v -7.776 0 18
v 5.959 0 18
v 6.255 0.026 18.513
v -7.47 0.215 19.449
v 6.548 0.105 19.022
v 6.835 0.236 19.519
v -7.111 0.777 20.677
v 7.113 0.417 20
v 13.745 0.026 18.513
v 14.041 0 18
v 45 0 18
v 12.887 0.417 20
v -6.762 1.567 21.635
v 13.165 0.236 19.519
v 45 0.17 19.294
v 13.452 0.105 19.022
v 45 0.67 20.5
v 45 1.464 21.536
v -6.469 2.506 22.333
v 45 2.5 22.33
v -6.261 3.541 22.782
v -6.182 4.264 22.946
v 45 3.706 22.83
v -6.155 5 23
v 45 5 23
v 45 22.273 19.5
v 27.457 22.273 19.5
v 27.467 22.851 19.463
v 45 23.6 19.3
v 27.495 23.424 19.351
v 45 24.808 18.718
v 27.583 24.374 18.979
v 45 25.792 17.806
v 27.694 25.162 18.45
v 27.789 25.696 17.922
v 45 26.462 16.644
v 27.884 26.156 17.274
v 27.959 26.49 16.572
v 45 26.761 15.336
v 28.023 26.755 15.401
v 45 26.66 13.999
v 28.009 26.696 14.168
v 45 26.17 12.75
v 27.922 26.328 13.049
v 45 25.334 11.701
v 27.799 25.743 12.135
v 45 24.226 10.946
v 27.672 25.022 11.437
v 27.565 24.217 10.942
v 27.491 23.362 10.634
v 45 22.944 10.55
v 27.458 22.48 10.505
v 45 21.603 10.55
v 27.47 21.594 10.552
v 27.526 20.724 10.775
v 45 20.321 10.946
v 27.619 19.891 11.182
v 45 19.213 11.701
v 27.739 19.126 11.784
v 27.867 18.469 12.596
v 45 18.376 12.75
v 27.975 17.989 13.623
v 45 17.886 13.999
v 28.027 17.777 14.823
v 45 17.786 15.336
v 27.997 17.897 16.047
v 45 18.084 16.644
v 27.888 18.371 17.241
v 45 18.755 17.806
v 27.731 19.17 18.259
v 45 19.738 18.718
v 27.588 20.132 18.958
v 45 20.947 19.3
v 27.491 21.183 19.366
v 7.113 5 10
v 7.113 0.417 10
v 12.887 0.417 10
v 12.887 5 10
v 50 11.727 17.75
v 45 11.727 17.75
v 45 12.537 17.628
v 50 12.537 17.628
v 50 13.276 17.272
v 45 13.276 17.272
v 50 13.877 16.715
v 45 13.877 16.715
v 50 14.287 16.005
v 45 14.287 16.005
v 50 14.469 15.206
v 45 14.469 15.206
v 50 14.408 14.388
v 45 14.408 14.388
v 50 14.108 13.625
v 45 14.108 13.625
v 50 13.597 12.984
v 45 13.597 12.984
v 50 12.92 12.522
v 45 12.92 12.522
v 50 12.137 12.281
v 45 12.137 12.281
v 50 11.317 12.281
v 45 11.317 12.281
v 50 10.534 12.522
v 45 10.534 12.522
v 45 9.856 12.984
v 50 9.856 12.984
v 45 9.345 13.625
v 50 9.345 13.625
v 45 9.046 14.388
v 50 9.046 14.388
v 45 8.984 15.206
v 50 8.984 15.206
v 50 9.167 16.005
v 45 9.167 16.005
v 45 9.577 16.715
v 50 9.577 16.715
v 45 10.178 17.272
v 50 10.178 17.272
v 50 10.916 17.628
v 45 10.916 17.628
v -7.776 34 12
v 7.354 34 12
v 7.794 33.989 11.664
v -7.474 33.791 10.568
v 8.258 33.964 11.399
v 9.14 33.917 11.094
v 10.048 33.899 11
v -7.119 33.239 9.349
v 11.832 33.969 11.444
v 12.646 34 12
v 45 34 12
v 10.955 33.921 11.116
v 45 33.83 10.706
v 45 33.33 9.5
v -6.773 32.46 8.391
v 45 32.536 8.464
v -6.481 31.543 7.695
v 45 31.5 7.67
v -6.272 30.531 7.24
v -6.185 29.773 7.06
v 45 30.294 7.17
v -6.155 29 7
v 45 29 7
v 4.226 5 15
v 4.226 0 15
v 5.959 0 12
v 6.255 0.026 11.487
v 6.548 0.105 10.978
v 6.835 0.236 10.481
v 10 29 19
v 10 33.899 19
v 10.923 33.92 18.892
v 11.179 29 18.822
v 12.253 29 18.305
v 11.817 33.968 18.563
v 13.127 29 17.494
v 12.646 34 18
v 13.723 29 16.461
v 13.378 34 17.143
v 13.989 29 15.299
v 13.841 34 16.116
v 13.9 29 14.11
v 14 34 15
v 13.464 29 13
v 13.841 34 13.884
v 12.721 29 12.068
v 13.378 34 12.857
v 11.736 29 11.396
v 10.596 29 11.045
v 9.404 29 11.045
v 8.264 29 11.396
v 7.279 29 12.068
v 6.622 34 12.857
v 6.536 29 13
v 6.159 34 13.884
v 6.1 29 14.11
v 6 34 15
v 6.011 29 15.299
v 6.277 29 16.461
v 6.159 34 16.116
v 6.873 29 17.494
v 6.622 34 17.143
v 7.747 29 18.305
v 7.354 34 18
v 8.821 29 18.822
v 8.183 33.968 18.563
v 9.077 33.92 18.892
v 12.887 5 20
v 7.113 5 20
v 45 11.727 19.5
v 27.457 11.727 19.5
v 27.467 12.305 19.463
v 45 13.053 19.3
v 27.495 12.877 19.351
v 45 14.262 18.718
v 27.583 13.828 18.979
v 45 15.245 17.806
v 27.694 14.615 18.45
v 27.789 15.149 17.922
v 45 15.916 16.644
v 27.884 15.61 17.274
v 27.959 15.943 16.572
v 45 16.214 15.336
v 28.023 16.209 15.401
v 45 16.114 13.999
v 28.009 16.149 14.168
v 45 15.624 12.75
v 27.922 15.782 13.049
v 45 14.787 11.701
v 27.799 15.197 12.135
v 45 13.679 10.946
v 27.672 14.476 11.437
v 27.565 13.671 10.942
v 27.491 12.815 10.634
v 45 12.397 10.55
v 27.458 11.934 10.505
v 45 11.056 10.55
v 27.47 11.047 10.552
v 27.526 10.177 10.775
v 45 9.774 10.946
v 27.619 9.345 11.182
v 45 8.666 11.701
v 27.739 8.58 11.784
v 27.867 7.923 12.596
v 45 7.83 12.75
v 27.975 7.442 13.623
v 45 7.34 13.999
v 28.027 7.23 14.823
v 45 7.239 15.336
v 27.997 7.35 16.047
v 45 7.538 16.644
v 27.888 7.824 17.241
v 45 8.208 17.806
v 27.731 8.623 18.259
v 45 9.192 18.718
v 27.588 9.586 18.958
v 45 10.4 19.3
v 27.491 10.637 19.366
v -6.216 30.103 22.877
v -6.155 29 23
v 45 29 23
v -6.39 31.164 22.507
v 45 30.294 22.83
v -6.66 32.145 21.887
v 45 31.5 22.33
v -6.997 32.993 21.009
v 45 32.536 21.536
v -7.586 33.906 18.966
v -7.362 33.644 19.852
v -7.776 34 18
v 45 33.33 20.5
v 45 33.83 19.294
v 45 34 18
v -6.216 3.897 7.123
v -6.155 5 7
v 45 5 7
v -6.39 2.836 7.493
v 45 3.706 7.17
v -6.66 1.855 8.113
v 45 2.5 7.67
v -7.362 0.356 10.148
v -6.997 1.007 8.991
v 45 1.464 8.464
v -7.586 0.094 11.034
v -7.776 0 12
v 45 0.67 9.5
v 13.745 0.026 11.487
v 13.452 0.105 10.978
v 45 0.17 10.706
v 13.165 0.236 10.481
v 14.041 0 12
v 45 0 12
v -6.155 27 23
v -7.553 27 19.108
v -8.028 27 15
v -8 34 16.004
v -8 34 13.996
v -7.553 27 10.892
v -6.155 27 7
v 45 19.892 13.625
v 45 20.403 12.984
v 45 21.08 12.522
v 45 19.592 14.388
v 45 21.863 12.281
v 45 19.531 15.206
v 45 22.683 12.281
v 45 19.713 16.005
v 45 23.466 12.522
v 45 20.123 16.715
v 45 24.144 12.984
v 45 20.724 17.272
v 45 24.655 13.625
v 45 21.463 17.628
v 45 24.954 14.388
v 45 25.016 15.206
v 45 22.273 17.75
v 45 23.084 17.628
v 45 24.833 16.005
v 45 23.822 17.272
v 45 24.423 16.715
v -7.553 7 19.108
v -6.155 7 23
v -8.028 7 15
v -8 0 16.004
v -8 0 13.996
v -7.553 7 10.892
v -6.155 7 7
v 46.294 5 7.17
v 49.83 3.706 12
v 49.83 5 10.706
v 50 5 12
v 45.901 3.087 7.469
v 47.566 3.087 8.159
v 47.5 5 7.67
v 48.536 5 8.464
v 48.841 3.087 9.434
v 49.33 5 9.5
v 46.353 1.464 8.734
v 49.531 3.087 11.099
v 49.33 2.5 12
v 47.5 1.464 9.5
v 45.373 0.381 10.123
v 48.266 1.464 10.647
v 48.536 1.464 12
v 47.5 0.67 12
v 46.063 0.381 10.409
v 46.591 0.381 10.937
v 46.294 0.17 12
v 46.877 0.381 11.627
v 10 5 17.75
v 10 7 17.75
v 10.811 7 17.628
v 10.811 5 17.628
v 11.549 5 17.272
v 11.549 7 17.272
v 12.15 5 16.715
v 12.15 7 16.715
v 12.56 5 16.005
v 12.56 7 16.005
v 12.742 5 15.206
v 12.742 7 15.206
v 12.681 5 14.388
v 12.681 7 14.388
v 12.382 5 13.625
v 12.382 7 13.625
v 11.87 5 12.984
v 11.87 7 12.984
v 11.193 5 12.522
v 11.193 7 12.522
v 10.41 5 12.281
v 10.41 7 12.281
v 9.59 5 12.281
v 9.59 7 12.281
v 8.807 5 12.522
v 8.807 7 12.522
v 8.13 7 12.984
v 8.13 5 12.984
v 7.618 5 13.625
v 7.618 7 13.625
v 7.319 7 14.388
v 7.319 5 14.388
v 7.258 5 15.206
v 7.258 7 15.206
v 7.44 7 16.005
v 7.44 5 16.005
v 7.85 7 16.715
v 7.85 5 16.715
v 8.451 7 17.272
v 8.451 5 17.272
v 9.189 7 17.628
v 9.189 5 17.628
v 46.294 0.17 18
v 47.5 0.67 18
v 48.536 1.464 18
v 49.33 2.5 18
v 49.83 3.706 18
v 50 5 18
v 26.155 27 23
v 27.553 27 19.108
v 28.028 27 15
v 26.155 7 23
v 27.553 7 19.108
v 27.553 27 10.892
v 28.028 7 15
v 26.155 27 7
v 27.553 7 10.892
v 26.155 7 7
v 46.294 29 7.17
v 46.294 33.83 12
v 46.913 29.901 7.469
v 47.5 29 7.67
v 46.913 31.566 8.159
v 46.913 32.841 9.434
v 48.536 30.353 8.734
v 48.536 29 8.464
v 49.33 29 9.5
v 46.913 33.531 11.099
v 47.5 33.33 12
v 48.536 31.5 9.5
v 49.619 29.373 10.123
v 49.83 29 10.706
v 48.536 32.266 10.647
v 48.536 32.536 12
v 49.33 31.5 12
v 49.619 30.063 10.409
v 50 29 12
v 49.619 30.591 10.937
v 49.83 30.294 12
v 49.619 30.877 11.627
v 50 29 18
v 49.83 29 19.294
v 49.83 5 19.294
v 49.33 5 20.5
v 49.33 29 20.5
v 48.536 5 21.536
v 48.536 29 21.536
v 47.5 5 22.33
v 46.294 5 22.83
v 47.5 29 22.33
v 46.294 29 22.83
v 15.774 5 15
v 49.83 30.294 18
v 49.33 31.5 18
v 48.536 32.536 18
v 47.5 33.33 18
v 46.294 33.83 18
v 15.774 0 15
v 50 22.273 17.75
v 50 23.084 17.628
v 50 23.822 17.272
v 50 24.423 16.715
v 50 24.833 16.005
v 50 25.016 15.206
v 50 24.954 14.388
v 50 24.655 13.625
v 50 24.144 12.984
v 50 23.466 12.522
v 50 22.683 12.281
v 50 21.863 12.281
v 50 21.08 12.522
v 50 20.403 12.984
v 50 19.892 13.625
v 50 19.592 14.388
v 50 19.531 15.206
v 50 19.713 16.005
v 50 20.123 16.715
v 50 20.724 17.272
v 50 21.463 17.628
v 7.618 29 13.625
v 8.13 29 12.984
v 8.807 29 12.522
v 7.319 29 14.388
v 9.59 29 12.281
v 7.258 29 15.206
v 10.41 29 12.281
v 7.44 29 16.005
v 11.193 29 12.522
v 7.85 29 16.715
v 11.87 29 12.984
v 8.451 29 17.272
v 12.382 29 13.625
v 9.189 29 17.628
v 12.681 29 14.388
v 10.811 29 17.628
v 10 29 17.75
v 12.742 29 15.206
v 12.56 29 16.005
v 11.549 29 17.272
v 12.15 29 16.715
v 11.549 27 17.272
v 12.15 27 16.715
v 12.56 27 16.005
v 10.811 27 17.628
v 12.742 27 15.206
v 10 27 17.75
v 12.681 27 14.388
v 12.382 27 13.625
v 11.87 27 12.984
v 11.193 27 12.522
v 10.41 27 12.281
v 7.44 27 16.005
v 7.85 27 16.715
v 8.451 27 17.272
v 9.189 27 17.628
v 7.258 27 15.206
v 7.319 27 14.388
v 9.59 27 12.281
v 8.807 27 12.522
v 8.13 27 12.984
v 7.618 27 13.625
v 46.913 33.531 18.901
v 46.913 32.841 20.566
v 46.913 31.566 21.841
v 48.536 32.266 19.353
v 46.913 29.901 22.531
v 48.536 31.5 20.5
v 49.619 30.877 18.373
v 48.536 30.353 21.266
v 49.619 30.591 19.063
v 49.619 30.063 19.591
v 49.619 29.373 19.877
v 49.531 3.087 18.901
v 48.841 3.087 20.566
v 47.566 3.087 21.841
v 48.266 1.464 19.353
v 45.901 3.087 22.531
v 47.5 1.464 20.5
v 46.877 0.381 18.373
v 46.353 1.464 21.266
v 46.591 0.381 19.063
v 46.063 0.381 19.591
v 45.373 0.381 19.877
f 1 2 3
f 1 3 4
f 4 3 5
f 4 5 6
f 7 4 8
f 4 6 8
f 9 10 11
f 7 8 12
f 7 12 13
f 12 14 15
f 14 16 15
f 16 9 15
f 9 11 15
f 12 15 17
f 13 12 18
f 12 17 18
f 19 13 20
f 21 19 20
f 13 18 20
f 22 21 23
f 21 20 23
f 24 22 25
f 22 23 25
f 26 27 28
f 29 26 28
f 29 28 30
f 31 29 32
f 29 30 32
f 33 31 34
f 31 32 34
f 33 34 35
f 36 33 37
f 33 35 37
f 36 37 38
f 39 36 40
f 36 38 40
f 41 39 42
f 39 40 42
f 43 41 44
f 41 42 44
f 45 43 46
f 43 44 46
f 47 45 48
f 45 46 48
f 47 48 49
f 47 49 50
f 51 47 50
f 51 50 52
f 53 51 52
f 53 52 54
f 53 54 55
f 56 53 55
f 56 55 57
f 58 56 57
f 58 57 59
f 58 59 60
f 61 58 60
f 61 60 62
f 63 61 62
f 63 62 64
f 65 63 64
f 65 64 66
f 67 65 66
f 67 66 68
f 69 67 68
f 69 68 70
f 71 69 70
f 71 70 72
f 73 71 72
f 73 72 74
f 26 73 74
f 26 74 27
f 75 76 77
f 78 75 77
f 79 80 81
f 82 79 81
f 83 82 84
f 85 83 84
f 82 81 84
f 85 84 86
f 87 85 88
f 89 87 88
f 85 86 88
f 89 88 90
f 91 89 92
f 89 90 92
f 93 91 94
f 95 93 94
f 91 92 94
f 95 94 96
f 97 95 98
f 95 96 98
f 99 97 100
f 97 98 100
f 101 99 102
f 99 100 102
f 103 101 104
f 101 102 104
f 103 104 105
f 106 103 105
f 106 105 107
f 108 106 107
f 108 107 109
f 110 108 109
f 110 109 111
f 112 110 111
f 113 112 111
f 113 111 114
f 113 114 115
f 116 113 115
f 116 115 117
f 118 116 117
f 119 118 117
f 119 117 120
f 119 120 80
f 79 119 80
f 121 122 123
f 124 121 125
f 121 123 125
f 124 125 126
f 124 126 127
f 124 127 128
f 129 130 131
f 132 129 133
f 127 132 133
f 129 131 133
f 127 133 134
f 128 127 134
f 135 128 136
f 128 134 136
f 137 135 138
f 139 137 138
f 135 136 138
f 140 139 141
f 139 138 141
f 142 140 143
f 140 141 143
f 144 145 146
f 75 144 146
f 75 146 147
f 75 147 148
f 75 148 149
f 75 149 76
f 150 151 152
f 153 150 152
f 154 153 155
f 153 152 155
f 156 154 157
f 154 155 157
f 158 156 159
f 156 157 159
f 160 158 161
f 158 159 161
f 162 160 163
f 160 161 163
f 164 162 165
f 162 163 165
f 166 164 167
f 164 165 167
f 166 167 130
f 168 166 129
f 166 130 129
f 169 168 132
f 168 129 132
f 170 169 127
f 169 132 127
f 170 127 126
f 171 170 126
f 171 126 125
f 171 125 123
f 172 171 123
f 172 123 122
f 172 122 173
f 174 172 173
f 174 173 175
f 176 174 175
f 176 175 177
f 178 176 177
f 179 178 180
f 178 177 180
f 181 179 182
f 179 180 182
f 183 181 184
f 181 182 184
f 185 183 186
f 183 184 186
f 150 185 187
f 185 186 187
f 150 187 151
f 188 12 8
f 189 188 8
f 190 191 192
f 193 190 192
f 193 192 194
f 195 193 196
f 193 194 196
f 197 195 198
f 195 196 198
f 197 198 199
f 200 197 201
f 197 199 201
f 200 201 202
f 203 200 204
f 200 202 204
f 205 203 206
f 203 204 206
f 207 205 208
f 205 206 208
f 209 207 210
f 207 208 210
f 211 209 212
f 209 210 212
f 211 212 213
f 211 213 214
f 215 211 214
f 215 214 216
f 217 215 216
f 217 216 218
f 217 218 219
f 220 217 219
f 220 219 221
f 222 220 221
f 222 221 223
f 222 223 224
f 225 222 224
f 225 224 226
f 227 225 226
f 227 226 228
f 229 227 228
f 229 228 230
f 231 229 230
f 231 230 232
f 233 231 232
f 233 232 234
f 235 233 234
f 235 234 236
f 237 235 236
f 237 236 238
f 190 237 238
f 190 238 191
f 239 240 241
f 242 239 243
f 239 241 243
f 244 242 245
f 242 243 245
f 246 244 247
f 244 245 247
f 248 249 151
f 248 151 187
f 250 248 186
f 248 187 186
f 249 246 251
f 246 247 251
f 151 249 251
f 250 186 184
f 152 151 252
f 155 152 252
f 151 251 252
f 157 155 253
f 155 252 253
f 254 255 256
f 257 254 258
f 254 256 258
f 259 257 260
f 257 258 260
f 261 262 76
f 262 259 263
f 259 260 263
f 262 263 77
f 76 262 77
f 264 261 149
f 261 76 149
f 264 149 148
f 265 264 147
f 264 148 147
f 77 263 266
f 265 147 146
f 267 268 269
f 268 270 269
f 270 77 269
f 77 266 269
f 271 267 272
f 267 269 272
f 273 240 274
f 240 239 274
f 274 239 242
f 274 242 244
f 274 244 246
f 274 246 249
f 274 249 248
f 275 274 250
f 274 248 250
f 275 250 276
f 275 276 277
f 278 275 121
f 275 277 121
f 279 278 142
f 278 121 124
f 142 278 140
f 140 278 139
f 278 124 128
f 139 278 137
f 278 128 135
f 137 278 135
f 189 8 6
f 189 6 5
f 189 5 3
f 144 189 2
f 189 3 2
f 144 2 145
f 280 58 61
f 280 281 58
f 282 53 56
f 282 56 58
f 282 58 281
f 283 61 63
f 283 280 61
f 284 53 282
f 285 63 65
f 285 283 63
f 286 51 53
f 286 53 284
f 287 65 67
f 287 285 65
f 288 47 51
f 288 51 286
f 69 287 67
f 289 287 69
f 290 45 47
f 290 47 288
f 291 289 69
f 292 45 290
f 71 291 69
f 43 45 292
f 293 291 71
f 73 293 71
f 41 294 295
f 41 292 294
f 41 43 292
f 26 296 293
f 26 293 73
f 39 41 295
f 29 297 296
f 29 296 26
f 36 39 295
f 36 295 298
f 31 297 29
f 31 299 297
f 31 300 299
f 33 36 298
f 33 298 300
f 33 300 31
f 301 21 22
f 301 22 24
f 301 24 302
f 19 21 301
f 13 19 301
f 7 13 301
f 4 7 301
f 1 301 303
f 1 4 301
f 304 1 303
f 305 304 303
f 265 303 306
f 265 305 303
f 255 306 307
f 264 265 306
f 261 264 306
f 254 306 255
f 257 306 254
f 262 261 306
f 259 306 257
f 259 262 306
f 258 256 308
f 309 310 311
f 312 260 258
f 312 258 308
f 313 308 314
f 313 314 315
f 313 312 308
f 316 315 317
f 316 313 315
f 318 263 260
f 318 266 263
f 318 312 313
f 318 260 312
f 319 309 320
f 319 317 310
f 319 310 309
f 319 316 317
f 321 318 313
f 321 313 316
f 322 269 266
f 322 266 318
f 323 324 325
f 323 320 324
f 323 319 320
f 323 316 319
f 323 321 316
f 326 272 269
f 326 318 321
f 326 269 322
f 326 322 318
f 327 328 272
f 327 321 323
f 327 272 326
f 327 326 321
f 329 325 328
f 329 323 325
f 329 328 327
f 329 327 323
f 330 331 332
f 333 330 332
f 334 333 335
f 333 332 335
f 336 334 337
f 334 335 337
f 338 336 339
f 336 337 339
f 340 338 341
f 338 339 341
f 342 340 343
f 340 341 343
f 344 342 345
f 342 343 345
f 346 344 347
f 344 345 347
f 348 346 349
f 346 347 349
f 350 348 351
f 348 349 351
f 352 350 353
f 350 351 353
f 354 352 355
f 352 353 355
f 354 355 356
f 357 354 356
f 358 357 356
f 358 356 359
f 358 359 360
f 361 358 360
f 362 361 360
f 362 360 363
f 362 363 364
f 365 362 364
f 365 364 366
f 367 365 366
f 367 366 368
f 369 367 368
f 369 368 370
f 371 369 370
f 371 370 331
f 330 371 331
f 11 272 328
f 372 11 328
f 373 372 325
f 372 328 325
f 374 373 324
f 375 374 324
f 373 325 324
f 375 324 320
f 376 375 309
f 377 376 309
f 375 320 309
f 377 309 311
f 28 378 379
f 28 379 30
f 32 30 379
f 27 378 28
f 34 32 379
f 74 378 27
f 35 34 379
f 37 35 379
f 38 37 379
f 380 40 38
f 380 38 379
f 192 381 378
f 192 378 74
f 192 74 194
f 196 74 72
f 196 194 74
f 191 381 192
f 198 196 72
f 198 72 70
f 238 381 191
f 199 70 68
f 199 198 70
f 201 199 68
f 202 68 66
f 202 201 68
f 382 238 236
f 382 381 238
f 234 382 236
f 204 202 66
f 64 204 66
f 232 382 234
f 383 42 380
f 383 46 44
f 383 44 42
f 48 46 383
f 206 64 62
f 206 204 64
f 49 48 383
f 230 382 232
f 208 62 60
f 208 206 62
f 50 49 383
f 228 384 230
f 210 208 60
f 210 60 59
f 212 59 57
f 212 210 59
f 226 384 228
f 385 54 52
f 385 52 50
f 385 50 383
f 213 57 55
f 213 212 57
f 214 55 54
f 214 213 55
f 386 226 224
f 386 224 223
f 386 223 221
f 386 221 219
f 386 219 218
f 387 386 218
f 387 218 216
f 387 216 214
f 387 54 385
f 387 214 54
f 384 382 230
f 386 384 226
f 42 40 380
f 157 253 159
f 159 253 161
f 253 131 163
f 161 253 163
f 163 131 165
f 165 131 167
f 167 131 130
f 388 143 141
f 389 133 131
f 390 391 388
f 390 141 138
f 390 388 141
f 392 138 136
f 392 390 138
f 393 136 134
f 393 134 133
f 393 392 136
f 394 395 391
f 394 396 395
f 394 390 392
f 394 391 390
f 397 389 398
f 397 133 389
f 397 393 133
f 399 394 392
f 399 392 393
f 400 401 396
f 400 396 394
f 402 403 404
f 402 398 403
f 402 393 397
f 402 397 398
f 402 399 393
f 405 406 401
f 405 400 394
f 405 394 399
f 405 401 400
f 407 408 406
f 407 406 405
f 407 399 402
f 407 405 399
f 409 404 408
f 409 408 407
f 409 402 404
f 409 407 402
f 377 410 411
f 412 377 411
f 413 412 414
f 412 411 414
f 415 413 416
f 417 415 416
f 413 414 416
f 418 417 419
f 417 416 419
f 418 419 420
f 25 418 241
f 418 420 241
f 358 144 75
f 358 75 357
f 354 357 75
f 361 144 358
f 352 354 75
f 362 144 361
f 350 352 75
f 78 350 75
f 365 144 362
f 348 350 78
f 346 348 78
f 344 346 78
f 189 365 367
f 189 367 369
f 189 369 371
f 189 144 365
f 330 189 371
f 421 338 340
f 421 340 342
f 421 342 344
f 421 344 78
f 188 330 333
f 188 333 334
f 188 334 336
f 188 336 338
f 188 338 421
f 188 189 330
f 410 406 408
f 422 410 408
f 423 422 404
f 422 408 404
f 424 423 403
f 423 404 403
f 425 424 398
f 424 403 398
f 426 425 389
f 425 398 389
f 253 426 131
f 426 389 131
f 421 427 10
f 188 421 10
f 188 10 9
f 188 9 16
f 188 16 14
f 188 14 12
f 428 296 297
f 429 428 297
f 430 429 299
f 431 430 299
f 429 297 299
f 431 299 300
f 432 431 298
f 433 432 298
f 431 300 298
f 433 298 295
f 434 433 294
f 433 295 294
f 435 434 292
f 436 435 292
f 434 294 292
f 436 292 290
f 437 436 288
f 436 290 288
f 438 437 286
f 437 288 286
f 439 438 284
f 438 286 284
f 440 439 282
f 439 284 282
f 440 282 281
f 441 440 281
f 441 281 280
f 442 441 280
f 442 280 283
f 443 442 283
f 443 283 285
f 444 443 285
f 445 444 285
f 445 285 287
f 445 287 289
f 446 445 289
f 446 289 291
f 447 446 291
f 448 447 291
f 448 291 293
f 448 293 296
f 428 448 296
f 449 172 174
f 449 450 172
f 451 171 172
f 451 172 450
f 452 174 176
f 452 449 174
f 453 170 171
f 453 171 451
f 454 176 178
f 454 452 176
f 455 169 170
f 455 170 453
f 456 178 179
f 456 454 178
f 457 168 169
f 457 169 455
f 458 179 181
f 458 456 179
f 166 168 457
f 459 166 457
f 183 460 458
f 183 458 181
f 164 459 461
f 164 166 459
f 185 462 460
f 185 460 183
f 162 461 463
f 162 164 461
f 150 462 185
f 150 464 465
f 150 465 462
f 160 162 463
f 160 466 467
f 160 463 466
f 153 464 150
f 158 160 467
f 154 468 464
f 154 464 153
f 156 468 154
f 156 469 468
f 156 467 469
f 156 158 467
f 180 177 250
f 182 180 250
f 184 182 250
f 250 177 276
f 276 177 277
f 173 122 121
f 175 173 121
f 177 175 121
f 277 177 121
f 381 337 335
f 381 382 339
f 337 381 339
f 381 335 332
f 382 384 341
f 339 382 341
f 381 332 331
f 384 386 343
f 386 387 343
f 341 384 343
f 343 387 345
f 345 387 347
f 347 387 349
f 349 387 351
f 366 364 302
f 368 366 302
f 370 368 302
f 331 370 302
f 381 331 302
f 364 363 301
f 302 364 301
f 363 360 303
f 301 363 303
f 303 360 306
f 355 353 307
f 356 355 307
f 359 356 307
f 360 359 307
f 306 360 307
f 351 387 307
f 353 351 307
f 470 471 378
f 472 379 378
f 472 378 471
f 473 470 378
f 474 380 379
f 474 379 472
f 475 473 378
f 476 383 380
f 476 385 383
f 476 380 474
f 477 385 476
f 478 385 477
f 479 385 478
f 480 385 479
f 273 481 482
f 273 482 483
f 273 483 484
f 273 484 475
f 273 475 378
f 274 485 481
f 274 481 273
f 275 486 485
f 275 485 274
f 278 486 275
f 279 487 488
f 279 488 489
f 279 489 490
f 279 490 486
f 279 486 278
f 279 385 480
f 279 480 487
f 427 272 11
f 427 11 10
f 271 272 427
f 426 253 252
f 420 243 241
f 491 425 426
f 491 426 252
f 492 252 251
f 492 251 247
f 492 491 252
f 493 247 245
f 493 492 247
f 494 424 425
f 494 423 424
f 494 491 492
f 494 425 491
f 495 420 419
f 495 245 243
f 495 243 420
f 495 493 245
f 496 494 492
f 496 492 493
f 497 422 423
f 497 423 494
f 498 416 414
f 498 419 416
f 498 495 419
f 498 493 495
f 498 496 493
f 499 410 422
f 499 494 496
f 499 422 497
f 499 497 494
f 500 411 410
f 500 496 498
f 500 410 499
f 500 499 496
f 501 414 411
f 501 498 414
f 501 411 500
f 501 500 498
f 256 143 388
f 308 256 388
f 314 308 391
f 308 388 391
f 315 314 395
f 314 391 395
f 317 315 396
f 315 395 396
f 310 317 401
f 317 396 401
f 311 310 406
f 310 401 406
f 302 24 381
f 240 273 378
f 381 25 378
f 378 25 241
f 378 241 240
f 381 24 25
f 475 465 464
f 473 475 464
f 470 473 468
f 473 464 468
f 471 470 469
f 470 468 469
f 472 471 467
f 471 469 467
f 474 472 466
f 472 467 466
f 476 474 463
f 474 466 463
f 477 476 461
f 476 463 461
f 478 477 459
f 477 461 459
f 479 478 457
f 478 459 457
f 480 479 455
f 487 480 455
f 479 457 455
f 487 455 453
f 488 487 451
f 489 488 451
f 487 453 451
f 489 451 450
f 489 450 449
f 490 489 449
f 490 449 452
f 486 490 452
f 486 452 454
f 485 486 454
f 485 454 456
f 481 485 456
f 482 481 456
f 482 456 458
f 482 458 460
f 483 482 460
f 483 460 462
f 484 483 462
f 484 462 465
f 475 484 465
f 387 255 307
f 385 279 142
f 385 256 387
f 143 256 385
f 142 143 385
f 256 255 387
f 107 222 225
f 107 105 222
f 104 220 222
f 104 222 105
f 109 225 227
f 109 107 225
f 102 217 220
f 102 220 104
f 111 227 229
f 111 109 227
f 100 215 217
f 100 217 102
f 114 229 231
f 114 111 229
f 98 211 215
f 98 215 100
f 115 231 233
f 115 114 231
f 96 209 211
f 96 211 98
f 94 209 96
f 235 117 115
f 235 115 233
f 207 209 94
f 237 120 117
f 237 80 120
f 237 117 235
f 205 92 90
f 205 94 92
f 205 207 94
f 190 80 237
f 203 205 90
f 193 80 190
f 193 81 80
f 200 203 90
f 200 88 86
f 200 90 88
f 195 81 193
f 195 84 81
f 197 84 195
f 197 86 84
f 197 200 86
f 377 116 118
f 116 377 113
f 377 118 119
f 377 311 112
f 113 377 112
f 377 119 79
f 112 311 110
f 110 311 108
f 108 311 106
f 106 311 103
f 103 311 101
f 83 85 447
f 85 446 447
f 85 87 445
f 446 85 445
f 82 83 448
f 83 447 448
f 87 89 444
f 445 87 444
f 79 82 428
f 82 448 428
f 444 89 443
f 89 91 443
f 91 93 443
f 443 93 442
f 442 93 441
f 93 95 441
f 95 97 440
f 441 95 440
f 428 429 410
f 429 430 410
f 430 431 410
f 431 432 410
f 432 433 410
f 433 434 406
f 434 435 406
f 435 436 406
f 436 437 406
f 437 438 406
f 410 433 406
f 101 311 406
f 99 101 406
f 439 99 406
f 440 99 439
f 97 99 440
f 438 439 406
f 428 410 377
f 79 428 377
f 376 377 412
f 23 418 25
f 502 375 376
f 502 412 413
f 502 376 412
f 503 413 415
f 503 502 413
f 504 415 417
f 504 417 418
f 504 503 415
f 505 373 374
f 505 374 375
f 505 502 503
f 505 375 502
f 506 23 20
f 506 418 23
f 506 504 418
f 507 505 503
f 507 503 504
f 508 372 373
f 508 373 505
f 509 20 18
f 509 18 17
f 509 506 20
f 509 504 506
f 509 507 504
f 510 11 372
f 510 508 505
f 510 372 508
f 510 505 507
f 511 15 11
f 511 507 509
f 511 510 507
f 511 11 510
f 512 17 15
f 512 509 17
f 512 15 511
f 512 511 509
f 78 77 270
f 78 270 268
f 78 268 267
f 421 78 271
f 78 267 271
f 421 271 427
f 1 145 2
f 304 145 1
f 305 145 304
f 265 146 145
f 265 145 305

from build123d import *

# Parameters (mm, degrees)
ESQUISSE1_W             = 50
ESQUISSE1_H             = 34
BOSS_EXTRU_1_DEPTH      = 30
BOSS_EXTRU_2_DEPTH      = 7
ESQUISSE4_R             = 4
ENL_V_MAT_EXTRU_1_DEPTH = 5
ESQUISSE5_R             = 2.75
ENL_V_MAT_EXTRU_2_DEPTH = 66.122960621
ENL_V_MAT_EXTRU_3_DEPTH = 5
ESQUISSE7_R             = 2.75
ENL_V_MAT_EXTRU_4_DEPTH = 68.498148123
ESQUISSE8_R             = 4.5
ENL_V_MAT_EXTRU_5_DEPTH = 45
ESQUISSE9_W             = 20
ESQUISSE9_H             = 20
ENL_V_MAT_EXTRU_6_DEPTH = 68.498148123
ESQUISSE11_R            = 18.027756377
ENL_V_MAT_EXTRU_7_DEPTH = 20
ESQUISSE12_W            = 7
ESQUISSE12_H            = 34
ENL_V_MAT_EXTRU_8_DEPTH = 74.642518399
CONG_1_R                = 5


with BuildPart() as part:
    # Esquisse1 → Boss.-Extru.1 (new body)
    with BuildSketch(Plane.XY):
        with Locations((25, 17)):
            Rectangle(ESQUISSE1_W, ESQUISSE1_H)
    extrude(amount=BOSS_EXTRU_1_DEPTH)

    # Esquisse3 → Boss.-Extru.2 (add)
    with BuildSketch(Plane(origin=(0, 34, 0), x_dir=(1, 0, 0), z_dir=(0, 1, 0))):
        with BuildLine():
            Line((0, 0), (0, -30))
            ThreePointArc((0, -30), (-8.027756377, -15), (0, 0))
        make_face()
    boss_extru_2 = extrude(amount=-BOSS_EXTRU_2_DEPTH)

    # Symétrie1: Boss.-Extru.2 across plane
    add(boss_extru_2.mirror(Plane.ZX.offset(17)))

    # Esquisse4 → Enlèv. mat.-Extru.1 (cut)
    with BuildSketch(Plane(origin=(0, 34, 0), x_dir=(1, 0, 0), z_dir=(0, 1, 0))):
        with Locations(Location((10, -15, 0), (0, 0, 270))):
            Circle(ESQUISSE4_R)
    extrude(amount=-ENL_V_MAT_EXTRU_1_DEPTH, mode=Mode.SUBTRACT)

    # Esquisse5 → Enlèv. mat.-Extru.2 (cut, through all)
    with BuildSketch(Plane(origin=(0, 29, 0), x_dir=(1, 0, 0), z_dir=(0, 1, 0))):
        with Locations(Location((10, -15, 0), (0, 0, 270))):
            Circle(ESQUISSE5_R)
    extrude(amount=-ENL_V_MAT_EXTRU_2_DEPTH, mode=Mode.SUBTRACT)

    # Esquisse6 → Enlèv. mat.-Extru.3 (cut)
    with BuildSketch(Plane.XZ):
        Polygon((7.113248654, 20), (4.226497308, 15), (7.113248654, 10), (12.886751346, 10), (15.773502692, 15), (12.886751346, 20), align=None)
    extrude(amount=-ENL_V_MAT_EXTRU_3_DEPTH, mode=Mode.SUBTRACT)

    # Esquisse7 → Enlèv. mat.-Extru.4 (cut, through all)
    with BuildSketch(Plane.ZY):
        with Locations((15, 11.726702535)):
            Circle(ESQUISSE7_R)
        with Locations((15, 22.273297465)):
            Circle(ESQUISSE7_R)
    extrude(amount=-ENL_V_MAT_EXTRU_4_DEPTH, mode=Mode.SUBTRACT)

    # Esquisse8 → Enlèv. mat.-Extru.5 (cut)
    with BuildSketch(Plane.ZY):
        with Locations((15, 11.726702535)):
            Circle(ESQUISSE8_R)
        with Locations((15, 22.273297465)):
            Circle(ESQUISSE8_R)
    extrude(amount=-ENL_V_MAT_EXTRU_5_DEPTH, mode=Mode.SUBTRACT)

    # Esquisse9 → Enlèv. mat.-Extru.6 (cut, through all)
    with BuildSketch(Plane(origin=(0, 0, 0), x_dir=(-1, 0, 0), z_dir=(0, 0, -1))):
        with Locations((-10, 17)):
            Rectangle(ESQUISSE9_W, ESQUISSE9_H)
    extrude(amount=-ENL_V_MAT_EXTRU_6_DEPTH, mode=Mode.SUBTRACT)

    # Esquisse11 → Enlèv. mat.-Extru.7 (cut)
    with BuildSketch(Plane(origin=(0, 7, 0), x_dir=(1, 0, 0), z_dir=(0, 1, 0))):
        with Locations((10, -15)):
            Circle(ESQUISSE11_R)
    extrude(amount=ENL_V_MAT_EXTRU_7_DEPTH, mode=Mode.SUBTRACT)

    # Esquisse12 → Enlèv. mat.-Extru.8 (cut, through all)
    with BuildSketch(Plane(origin=(50, 0, 0), x_dir=(0, 0, -1), z_dir=(1, 0, 0))):
        with Locations((-3.5, 17)):
            Rectangle(ESQUISSE12_W, ESQUISSE12_H)
        with Locations((-26.5, 17)):
            Rectangle(ESQUISSE12_W, ESQUISSE12_H)
    extrude(amount=-ENL_V_MAT_EXTRU_8_DEPTH, mode=Mode.SUBTRACT)

    # Congé1
    # the kernel refuses this fillet: 5 mm, written as the material it takes off along each edge
    with BuildSketch(Plane(origin=(45, 5, 12), x_dir=(1, 0, 0), z_dir=(0, -1, 0))) as cong_1_piece_1_section:
        Polygon((0, 0), (CONG_1_R, 0), (CONG_1_R, -CONG_1_R), (0, -CONG_1_R), align=None)
    cong_1_piece_1 = extrude(amount=CONG_1_R, mode=Mode.PRIVATE)
    cong_1_piece_1 = cong_1_piece_1 - Plane(origin=(45, 5, 12), x_dir=(-0.7071067811865475, 0, 0.7071067811865475), z_dir=(0, -1, 0)) * Sphere(CONG_1_R, mode=Mode.PRIVATE)
    add(cong_1_piece_1, mode=Mode.SUBTRACT)
    with BuildSketch(Plane(origin=(45, 5, 18), x_dir=(1, 0, 0), z_dir=(0, -1, 0))) as cong_1_piece_2_section:
        Polygon((0, 0), (CONG_1_R, 0), (CONG_1_R, CONG_1_R), (0, CONG_1_R), align=None)
    cong_1_piece_2 = extrude(amount=CONG_1_R, mode=Mode.PRIVATE)
    cong_1_piece_2 = cong_1_piece_2 - Plane(origin=(45, 5, 18), x_dir=(-0.7071067811865475, 0, -0.7071067811865475), z_dir=(0, -1, 0)) * Sphere(CONG_1_R, mode=Mode.PRIVATE)
    add(cong_1_piece_2, mode=Mode.SUBTRACT)
    with BuildSketch(Plane(origin=(45, 29, 12), x_dir=(0, 1, 0), z_dir=(1, 0, 0))) as cong_1_piece_3_section:
        Polygon((0, 0), (CONG_1_R, 0), (CONG_1_R, -CONG_1_R), (0, -CONG_1_R), align=None)
    cong_1_piece_3 = extrude(amount=CONG_1_R, mode=Mode.PRIVATE)
    cong_1_piece_3 = cong_1_piece_3 - Plane(origin=(45, 29, 12), x_dir=(0, -0.7071067811865475, 0.7071067811865475), z_dir=(1, 0, 0)) * Sphere(CONG_1_R, mode=Mode.PRIVATE)
    add(cong_1_piece_3, mode=Mode.SUBTRACT)
    with BuildSketch(Plane(origin=(45, 29, 18), x_dir=(0, 0, 1), z_dir=(1, 0, 0))) as cong_1_piece_4_section:
        Polygon((0, 0), (CONG_1_R, 0), (CONG_1_R, -CONG_1_R), (0, -CONG_1_R), align=None)
    cong_1_piece_4 = extrude(amount=CONG_1_R, mode=Mode.PRIVATE)
    cong_1_piece_4 = cong_1_piece_4 - Plane(origin=(45, 29, 18), x_dir=(0, -0.7071067811865475, -0.7071067811865476), z_dir=(1, 0, 0)) * Sphere(CONG_1_R, mode=Mode.PRIVATE)
    add(cong_1_piece_4, mode=Mode.SUBTRACT)
    with BuildSketch(Plane(origin=(50, 0, 12), x_dir=(-1, 0, 0), z_dir=(0, 0, 1)), Plane(origin=(50, 34, 12), x_dir=(0, -1, 0), z_dir=(0, 0, 1))) as cong_1_piece_5:
        with BuildLine():
            CenterArc((CONG_1_R, -CONG_1_R), CONG_1_R, 90, 90)
            Line((0, -CONG_1_R), (0, 0))
            Line((0, 0), (CONG_1_R, 0))
        make_face()
    extrude(amount=6, mode=Mode.SUBTRACT)
    with BuildSketch(Plane(origin=(50, 29, 7), x_dir=(0, 0, 1), z_dir=(0, -1, 0))) as cong_1_piece_6:
        with BuildLine():
            CenterArc((CONG_1_R, CONG_1_R), CONG_1_R, 180, 90)
            Line((0, CONG_1_R), (0, 0))
            Line((0, 0), (CONG_1_R, 0))
        make_face()
    extrude(amount=24, mode=Mode.SUBTRACT)
    with BuildSketch(Plane(origin=(50, 29, 23), x_dir=(0, 0, -1), z_dir=(0, -1, 0))) as cong_1_piece_7:
        with BuildLine():
            CenterArc((CONG_1_R, -CONG_1_R), CONG_1_R, 90, 90)
            Line((0, -CONG_1_R), (0, 0))
            Line((0, 0), (CONG_1_R, 0))
        make_face()
    extrude(amount=24, mode=Mode.SUBTRACT)
    with BuildSketch(Plane(origin=(45, 34, 7), x_dir=(0, -1, 0), z_dir=(-1, 0, 0)), Plane(origin=(45, 0, 7), x_dir=(0, 0, 1), z_dir=(-1, 0, 0))) as cong_1_piece_8:
        with BuildLine():
            CenterArc((CONG_1_R, CONG_1_R), CONG_1_R, 180, 90)
            Line((0, CONG_1_R), (0, 0))
            Line((0, 0), (CONG_1_R, 0))
        make_face()
    extrude(amount=63.655494421, mode=Mode.SUBTRACT)
    with BuildSketch(Plane(origin=(45, 34, 23), x_dir=(0, -1, 0), z_dir=(-1, 0, 0)), Plane(origin=(45, 0, 23), x_dir=(0, 0, -1), z_dir=(-1, 0, 0))) as cong_1_piece_9:
        with BuildLine():
            CenterArc((CONG_1_R, -CONG_1_R), CONG_1_R, 90, 90)
            Line((0, -CONG_1_R), (0, 0))
            Line((0, 0), (CONG_1_R, 0))
        make_face()
    extrude(amount=63.655494421, mode=Mode.SUBTRACT)


solid = part.part
